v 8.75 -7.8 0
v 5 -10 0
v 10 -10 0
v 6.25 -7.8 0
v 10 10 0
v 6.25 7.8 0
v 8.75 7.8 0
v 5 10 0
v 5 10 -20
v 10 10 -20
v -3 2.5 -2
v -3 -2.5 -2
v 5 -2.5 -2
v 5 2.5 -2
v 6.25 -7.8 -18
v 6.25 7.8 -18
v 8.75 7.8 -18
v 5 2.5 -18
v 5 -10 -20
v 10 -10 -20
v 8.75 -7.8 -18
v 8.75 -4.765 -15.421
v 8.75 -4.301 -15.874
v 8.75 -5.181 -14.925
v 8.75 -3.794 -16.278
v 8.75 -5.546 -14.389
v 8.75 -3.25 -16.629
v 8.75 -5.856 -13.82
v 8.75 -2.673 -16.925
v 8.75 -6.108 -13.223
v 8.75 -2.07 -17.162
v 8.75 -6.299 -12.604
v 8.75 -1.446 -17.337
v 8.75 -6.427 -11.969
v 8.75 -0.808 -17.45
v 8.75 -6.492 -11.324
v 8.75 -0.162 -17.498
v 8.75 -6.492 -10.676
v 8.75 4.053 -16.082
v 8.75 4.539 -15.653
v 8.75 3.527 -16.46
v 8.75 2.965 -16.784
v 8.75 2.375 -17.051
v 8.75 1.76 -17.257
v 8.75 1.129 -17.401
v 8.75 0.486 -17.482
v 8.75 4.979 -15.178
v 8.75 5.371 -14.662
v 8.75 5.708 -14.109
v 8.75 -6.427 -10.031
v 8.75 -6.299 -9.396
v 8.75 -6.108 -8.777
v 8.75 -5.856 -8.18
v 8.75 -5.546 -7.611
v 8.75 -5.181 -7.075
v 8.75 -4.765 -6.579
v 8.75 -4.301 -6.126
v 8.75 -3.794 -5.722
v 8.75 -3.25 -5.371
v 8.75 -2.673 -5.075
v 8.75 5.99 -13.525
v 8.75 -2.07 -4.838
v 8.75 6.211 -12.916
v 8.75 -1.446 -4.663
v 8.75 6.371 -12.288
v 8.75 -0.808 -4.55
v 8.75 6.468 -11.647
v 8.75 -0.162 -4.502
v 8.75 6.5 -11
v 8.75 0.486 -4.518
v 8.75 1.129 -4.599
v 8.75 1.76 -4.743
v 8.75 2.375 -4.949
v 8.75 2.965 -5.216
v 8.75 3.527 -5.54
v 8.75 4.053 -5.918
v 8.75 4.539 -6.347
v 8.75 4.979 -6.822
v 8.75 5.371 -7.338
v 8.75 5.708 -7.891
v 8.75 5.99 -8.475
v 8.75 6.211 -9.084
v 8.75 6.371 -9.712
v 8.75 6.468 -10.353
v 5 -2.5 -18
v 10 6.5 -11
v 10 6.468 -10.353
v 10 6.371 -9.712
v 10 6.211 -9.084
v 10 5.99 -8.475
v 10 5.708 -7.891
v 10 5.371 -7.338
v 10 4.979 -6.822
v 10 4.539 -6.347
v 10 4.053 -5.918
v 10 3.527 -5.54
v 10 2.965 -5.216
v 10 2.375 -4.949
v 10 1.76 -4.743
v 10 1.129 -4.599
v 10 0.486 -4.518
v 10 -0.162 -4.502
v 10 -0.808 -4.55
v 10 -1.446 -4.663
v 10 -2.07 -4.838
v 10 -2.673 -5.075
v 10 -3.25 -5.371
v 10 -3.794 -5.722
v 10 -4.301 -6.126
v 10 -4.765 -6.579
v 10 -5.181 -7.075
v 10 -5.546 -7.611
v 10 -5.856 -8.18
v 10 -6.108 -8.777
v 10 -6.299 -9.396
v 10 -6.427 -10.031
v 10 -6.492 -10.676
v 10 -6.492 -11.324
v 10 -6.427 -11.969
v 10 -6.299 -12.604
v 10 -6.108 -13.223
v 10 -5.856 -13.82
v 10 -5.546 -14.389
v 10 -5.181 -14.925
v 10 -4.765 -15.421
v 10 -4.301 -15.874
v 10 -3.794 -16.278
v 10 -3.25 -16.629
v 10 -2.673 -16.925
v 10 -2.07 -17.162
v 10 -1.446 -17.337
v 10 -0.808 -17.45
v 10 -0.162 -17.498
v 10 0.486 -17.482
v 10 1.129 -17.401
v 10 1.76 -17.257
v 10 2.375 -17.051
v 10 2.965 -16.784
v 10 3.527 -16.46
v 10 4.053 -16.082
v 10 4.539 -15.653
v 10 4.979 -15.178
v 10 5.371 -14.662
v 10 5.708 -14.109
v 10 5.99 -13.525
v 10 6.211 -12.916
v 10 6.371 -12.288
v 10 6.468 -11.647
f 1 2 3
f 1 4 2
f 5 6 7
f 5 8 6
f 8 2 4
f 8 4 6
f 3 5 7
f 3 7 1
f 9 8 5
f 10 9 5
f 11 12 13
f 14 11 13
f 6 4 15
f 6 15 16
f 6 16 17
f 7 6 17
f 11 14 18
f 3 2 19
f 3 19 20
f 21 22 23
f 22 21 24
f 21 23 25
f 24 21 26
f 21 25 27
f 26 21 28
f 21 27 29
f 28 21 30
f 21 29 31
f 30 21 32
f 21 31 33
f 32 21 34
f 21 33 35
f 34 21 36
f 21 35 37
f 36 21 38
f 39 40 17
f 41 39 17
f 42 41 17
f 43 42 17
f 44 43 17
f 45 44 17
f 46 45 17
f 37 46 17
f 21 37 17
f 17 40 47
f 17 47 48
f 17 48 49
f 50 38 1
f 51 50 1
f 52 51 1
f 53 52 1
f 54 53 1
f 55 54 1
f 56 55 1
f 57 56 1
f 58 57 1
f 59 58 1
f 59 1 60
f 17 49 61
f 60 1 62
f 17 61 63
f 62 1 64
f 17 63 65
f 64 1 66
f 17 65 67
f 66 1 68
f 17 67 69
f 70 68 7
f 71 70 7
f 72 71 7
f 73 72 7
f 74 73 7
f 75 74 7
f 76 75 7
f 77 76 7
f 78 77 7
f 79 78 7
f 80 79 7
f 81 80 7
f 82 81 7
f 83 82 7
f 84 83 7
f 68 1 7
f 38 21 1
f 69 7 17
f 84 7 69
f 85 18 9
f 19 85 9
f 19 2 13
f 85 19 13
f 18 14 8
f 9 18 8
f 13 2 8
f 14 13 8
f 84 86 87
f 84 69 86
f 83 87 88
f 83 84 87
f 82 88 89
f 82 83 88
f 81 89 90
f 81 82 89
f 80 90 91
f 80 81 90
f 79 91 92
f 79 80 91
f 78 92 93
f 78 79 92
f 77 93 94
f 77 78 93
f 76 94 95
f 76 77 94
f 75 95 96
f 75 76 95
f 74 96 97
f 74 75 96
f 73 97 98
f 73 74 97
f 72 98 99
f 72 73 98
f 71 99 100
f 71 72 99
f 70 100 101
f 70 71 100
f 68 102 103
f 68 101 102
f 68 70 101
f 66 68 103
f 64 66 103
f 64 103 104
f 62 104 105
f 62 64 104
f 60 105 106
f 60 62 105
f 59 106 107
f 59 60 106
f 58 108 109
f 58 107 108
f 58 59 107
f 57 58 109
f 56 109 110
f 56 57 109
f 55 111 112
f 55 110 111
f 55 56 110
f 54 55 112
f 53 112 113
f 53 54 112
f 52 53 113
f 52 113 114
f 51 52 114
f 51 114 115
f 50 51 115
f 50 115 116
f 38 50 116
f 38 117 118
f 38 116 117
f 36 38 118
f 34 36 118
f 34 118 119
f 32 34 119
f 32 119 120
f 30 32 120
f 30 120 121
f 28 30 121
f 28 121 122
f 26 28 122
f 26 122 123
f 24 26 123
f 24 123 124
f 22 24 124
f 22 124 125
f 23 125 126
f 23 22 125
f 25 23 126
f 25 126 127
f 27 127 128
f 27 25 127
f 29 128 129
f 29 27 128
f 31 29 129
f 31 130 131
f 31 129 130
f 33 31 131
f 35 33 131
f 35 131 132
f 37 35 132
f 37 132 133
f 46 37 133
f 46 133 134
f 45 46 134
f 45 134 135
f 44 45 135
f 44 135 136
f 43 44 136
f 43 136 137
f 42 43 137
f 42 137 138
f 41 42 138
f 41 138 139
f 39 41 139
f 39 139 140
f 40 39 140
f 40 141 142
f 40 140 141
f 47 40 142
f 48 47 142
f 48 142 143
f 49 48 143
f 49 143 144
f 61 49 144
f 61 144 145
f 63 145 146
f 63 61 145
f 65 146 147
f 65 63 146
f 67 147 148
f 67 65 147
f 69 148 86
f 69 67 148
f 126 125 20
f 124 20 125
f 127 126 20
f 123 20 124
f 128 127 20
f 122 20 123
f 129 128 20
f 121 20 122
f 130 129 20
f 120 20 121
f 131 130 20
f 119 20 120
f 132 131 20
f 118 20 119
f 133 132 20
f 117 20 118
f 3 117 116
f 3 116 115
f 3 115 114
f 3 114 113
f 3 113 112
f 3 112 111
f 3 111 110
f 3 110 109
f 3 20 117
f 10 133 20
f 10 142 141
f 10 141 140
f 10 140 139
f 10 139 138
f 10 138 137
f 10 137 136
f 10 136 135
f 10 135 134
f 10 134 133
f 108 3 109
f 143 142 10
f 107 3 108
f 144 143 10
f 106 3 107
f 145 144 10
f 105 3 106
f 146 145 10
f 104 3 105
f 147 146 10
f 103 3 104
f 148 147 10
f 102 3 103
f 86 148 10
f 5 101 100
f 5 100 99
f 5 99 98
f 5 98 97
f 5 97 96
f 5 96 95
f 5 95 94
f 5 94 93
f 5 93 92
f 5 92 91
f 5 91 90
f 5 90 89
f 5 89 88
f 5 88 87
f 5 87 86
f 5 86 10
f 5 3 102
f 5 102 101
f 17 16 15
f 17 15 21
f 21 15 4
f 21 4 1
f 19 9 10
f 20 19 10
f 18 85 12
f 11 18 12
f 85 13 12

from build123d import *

# Parameters (mm, degrees)
SKETCH133_W       = 5
SKETCH133_H       = 20
PAD080_DEPTH      = 20
SKETCH134_W       = 2.5
SKETCH134_H       = 15.6
POCKET028_DEPTH   = 18
CYLINDER086_R     = 6.5
CYLINDER086_DEPTH = 3
PAD081_DEPTH      = 2.5


with BuildPart() as part:
    # Sketch133 → Pad080 (new body)
    with BuildSketch(Plane.XY):
        with Locations((2.5, 0)):
            Rectangle(SKETCH133_W, SKETCH133_H)
    extrude(amount=-PAD080_DEPTH)

    # Sketch134 → Pocket028 (cut)
    with BuildSketch(Plane(origin=(2.5, 0, 0), x_dir=(1, 0, 0), z_dir=(0, 0, 1))):
        Rectangle(SKETCH134_W, SKETCH134_H)
    extrude(amount=-POCKET028_DEPTH, mode=Mode.SUBTRACT)

    # Cylinder086 → Cylinder086 (cut)
    with BuildSketch(Plane(origin=(3, 0, -11), x_dir=(0, 1, 0), z_dir=(1, 0, 0))):
        Circle(CYLINDER086_R)
    extrude(amount=CYLINDER086_DEPTH, mode=Mode.SUBTRACT)

    # Sketch135 → Pad081 (join, symmetric)
    with BuildSketch(Plane(origin=(0, 0, -2), x_dir=(1, 0, 0), z_dir=(0, -1, 0))):
        Polygon((-8, 0), (0, 0), (0, -16), align=None)
    extrude(amount=PAD081_DEPTH, both=True)


with BuildPart() as part_1:
    # Body118 placement: moved
    add(part.part.moved(Location((5, 0, 0))))


solid = part_1.part
